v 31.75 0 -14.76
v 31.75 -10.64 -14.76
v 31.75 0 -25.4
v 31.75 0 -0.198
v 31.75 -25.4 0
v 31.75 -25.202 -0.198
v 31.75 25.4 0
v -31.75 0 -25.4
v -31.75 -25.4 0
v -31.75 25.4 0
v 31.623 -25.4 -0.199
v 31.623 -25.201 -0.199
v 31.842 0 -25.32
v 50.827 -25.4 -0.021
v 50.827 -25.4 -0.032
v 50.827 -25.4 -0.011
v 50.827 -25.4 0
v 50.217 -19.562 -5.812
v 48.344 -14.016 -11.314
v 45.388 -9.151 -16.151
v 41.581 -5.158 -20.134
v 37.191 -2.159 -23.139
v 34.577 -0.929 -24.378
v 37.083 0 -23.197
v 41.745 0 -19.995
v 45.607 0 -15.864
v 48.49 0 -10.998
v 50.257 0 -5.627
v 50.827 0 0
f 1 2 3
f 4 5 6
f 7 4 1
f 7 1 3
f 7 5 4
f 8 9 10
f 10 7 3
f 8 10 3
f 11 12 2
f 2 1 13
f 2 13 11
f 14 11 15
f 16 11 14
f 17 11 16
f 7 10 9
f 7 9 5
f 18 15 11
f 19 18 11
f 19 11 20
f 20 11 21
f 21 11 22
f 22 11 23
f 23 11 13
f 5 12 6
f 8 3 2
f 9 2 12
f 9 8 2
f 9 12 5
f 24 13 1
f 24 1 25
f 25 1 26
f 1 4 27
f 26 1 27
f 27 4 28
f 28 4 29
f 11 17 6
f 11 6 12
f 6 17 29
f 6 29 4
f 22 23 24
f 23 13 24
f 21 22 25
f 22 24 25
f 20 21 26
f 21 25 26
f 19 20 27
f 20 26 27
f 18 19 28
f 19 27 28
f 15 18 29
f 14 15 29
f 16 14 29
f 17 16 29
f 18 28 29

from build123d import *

# Parameters (mm, degrees)
F0_W        = 63.5
F0_H        = 76.2
F1_DEPTH    = 25.4
F2_T1_DEPTH = 259.462243683
F3_T1_DEPTH = 259.462243683
F5_DEPTH    = 25.4
F7_DEPTH    = 25.4


# Not quite as in the source:
# - a fillet or chamfer that OpenCascade refuses, or shapes differently, is made with other operations: its cross-section is extruded or revolved along the edge and cut away or added


with BuildPart() as f1:
    # F0 (on Top) → F1 (new body)
    with BuildSketch(Plane.XY):
        Rectangle(F0_W, F0_H)
    extrude(amount=-F1_DEPTH)

    # F2: chamfer of 38.1 on 1 edges, made by hand

    # F2_s2 → F2_t1 (cut)
    with BuildSketch(Plane.YZ.offset(-129.7311218415)):
        Polygon((38.1, 12.7), (0, -25.4), (38.1, -25.4), align=None)
    extrude(amount=F2_T1_DEPTH, mode=Mode.SUBTRACT)

    # F3: chamfer of 38.1 on 1 edges, made by hand

    # F3_s2 → F3_t1 (cut)
    with BuildSketch(Plane.YZ.offset(-129.7311218415)):
        Polygon((0, -25.4), (-38.1, 12.7), (-38.1, -25.4), align=None)
    extrude(amount=F3_T1_DEPTH, mode=Mode.SUBTRACT)

    # F4 (on Front) → F5 (join)
    with BuildSketch(Plane.XZ):
        with BuildLine():
            Line((31.6233746707, -0.1989824377), (31.8418294191, -25.3204219043))
            ThreePointArc((31.8418294191, -25.3204219043), (45.6070605547, -15.863879172), (50.8267469704, 0))
            Line((50.8267469704, 0), (31.6233746707, -0.1989824377))
        make_face()
    extrude(amount=F5_DEPTH)

    # F6 (on face) → F7 (cut)
    with BuildSketch(Plane(origin=(31.6192532968, 0, 0.274959404), x_dir=(0, -1, 0), z_dir=(-0.9999621924, 0, -0.0086956199))):
        Polygon((25.4, -0.473959761), (0, -25.5963490453), (25.4, -25.5963490453), align=None)
    extrude(amount=-F7_DEPTH, mode=Mode.SUBTRACT)


solid = f1.part
